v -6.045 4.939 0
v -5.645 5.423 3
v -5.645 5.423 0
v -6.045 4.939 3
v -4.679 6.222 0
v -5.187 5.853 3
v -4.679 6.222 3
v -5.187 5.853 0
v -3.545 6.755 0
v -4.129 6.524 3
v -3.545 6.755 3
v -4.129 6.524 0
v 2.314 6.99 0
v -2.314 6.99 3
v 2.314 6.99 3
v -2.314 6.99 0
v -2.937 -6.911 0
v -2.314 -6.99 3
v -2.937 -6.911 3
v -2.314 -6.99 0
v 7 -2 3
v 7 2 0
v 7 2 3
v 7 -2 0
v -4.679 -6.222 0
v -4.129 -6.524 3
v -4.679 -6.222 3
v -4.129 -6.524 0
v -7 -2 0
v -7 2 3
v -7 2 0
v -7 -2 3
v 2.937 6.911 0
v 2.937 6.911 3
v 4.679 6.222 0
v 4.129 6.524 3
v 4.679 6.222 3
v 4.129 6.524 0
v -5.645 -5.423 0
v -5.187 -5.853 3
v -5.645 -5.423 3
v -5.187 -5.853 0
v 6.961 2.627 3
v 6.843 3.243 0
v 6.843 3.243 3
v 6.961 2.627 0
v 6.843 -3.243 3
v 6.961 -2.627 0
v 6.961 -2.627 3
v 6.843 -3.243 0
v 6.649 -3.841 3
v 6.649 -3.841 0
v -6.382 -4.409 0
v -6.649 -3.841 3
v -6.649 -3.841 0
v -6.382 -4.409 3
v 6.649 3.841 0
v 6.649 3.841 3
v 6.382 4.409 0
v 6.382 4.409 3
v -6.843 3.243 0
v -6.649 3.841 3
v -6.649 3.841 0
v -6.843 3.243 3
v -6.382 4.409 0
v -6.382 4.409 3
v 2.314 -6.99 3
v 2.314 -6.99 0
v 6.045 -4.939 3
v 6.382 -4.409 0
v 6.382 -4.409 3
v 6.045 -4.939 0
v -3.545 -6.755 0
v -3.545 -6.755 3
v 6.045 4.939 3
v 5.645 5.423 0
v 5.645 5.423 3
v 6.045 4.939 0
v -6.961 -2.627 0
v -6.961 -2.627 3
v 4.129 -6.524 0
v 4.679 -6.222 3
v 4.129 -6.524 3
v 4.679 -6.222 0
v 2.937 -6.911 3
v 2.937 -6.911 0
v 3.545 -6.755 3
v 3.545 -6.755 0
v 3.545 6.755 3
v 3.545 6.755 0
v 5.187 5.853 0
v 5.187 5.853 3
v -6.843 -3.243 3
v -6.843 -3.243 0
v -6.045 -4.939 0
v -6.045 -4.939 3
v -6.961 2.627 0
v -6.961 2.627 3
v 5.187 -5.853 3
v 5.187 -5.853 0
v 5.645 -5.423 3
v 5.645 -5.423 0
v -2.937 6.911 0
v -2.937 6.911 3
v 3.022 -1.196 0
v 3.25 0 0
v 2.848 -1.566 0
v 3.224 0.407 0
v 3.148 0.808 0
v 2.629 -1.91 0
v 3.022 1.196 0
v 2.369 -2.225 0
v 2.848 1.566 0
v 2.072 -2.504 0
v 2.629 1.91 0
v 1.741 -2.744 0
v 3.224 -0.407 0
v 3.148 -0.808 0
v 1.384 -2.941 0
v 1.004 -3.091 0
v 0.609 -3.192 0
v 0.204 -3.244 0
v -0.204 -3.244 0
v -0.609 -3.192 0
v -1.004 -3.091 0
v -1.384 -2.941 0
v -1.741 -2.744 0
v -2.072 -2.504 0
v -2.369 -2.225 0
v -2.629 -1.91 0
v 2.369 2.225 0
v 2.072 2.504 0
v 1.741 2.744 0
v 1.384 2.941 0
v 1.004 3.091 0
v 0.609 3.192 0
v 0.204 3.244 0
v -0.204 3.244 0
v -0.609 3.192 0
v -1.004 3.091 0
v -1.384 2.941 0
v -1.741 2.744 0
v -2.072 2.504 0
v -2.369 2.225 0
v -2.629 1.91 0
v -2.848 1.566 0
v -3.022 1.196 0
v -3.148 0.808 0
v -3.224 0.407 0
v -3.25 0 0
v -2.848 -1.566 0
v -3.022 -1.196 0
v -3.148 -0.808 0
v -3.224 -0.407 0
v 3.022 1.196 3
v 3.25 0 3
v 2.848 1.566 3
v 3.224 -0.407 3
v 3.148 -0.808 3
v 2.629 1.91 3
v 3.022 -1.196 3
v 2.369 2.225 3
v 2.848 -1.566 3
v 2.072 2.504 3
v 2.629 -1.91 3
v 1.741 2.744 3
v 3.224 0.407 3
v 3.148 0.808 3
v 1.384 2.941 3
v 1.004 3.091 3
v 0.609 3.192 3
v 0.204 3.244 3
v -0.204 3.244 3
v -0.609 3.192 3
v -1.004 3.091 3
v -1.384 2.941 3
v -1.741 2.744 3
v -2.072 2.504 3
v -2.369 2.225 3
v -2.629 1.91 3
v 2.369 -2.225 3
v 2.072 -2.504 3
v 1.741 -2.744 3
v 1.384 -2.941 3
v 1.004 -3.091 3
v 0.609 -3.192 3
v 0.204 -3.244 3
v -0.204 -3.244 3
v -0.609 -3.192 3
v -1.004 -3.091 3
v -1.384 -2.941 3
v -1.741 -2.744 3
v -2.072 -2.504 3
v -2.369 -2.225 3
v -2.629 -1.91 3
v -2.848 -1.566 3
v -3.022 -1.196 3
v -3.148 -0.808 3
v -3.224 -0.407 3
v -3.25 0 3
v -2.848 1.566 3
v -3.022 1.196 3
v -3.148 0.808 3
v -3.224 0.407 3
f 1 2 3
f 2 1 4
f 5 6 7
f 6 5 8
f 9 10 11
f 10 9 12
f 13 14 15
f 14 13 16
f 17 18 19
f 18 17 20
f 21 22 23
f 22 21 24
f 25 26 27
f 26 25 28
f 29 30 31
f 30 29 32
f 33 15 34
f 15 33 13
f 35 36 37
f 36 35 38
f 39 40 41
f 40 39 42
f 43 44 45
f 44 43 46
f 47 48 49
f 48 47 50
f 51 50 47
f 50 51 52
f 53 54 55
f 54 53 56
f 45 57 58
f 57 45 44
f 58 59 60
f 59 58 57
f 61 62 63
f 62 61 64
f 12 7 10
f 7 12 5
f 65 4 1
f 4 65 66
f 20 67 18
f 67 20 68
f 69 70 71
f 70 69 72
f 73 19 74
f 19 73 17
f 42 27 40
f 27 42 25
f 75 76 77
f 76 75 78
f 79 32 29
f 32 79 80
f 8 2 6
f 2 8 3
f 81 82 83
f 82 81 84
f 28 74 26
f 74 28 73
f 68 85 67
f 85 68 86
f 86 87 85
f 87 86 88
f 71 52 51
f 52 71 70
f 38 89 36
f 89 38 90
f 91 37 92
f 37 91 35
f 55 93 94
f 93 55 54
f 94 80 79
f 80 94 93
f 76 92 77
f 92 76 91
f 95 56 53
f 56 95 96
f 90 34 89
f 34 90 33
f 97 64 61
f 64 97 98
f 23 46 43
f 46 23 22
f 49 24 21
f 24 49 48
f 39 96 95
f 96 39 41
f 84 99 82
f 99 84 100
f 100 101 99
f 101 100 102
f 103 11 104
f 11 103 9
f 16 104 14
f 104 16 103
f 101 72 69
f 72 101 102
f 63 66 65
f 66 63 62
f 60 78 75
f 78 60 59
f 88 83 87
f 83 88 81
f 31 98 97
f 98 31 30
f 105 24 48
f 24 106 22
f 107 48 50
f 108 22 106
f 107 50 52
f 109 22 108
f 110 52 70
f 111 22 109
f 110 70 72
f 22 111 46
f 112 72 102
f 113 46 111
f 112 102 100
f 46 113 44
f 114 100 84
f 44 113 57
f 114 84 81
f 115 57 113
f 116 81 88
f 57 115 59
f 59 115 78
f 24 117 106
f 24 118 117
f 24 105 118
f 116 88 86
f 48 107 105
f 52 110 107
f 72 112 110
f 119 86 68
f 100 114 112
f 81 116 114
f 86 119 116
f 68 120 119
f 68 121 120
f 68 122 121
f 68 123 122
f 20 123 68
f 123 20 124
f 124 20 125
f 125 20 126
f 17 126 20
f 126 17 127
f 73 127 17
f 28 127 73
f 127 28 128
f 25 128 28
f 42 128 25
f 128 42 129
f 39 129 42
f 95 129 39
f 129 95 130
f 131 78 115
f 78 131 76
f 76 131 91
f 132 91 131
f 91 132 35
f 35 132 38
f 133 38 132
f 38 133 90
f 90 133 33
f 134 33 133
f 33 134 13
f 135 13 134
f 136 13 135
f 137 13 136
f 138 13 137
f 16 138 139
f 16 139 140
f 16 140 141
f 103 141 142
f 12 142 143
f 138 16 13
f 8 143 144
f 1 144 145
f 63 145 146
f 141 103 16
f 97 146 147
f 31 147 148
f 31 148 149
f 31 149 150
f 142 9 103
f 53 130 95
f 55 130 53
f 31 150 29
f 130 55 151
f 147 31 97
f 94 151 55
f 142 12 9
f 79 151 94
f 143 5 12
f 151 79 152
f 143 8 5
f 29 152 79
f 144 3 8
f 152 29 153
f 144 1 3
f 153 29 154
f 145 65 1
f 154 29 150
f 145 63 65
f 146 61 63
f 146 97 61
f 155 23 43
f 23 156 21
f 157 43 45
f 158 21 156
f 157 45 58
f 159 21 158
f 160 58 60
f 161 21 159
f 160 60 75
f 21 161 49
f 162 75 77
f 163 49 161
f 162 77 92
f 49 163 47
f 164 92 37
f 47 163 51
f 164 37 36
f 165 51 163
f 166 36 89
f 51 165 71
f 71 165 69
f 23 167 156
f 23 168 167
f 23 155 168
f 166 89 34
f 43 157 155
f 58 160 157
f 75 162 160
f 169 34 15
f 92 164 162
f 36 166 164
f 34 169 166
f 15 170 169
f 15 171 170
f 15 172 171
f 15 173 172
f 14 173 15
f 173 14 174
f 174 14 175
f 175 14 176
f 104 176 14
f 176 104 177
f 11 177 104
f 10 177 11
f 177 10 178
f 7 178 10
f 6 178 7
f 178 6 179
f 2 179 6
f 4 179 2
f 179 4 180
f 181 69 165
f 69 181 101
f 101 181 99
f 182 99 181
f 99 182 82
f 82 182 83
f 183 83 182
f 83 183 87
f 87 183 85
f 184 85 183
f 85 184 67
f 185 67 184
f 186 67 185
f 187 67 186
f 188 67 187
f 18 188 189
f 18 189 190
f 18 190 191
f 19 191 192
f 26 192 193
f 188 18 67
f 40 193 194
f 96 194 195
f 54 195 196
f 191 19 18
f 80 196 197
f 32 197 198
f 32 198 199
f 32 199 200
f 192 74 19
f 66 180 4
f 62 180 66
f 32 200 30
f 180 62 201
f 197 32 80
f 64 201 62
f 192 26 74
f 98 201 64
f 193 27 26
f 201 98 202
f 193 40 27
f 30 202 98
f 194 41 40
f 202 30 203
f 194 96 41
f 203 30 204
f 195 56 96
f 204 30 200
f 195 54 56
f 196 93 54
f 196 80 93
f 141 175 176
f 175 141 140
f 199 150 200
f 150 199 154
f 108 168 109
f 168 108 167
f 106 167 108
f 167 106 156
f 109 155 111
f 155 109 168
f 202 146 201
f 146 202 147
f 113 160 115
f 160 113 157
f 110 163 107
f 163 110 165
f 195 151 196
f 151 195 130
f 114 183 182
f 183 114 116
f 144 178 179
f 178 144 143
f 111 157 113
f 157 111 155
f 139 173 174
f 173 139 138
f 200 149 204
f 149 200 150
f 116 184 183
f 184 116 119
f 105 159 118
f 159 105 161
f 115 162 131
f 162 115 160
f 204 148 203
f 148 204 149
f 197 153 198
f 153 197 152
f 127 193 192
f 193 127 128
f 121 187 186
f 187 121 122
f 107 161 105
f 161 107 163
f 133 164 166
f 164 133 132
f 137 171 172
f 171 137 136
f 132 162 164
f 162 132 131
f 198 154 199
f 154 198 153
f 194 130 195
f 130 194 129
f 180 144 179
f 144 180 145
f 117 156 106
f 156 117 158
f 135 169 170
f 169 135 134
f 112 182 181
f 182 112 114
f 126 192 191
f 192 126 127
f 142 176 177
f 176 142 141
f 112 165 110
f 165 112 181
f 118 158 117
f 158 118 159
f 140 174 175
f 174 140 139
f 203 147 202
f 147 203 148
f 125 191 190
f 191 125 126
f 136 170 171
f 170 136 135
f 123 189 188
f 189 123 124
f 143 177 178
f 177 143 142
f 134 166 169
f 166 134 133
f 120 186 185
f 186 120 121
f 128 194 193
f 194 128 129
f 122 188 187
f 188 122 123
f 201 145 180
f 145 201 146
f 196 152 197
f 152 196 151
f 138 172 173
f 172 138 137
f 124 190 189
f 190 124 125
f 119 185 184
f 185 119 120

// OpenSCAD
// Generated by SolidPython 1.1.3 on 2023-03-12 21:50:26
$fn = 50;


difference() {
	union() {
		translate(v = [0, 0, 0]) {
			rotate(a = [0, 0, 0]) {
				hull() {
					translate(v = [-2.0000000000, 2.0000000000, 0]) {
						rotate(a = [0, 0, 0]) {
							translate(v = [0, 0, 0]) {
								rotate(a = [0, 0, 0]) {
									cylinder(h = 3, r = 5);
								}
							}
						}
					}
					translate(v = [2.0000000000, 2.0000000000, 0]) {
						rotate(a = [0, 0, 0]) {
							translate(v = [0, 0, 0]) {
								rotate(a = [0, 0, 0]) {
									cylinder(h = 3, r = 5);
								}
							}
						}
					}
					translate(v = [-2.0000000000, -2.0000000000, 0]) {
						rotate(a = [0, 0, 0]) {
							translate(v = [0, 0, 0]) {
								rotate(a = [0, 0, 0]) {
									cylinder(h = 3, r = 5);
								}
							}
						}
					}
					translate(v = [2.0000000000, -2.0000000000, 0]) {
						rotate(a = [0, 0, 0]) {
							translate(v = [0, 0, 0]) {
								rotate(a = [0, 0, 0]) {
									cylinder(h = 3, r = 5);
								}
							}
						}
					}
				}
			}
		}
	}
	union() {
		translate(v = [0.0000000000, 0.0000000000, 0]) {
			rotate(a = [0, 0, 0]) {
				translate(v = [0, 0, -50]) {
					rotate(a = [0, 0, 0]) {
						cylinder(h = 100, r = 3.2500000000);
					}
				}
			}
		}
	}
}
/***********************************************
*********      SolidPython code:      **********
************************************************
 
from solid import *
import os
import subprocess

import oomB

import opsc_library_gen

mode = "laser"
#mode = "3d_print"

defined_objects = {}

radius_dict = {}
countersunk_dict = {}


def set_mode(m):
    global mode
    mode = m
    radius_dict['M6'] = 6.5/2
    radius_dict['M3'] = 3.3/2
    if mode == "laser":
        radius_dict['M6'] = 6/2
        radius_dict['M3'] = 3/2

    countersunk_dict['M3'] = {}
    countersunk_dict['M3']['little_rad'] = radius_dict['M3']
    countersunk_dict['M3']['big_rad'] = (5.5+0.6)/2
    if mode == "laser":
        countersunk_dict['M3']['big_rad'] = (4.75+0.6)/2
        countersunk_dict['M3']['little_rad'] = (4.75+0.6)/2

    countersunk_dict['M3']['height'] = 1.7


def opsc_make_object(filename, objects, save_type="none",resolution=50, layers = 1, tilediff = 200, mode="laser", overwrite=True):
    if overwrite or not os.path.exists(filename):
        set_mode(mode)
        save_type = save_type.lower()
        os.makedirs(os.path.dirname(filename), exist_ok=True)
        final_object = opsc_get_object(objects, mode = mode)
        # Save the final object to the specified filename    
        scad_render_to_file(final_object, filename, file_header='$fn = %s;' % resolution, include_orig_code=True)
        if mode == "laser":
            filename_laser = filename.replace(".scad","-flat.scad")
            scad_render_to_file(getLaser(final_object, layers=layers, tilediff=tilediff), filename_laser, file_header='$fn = %s;' % resolution, include_orig_code=True)
            if save_type == "all":
                saveToAll(filename_laser)
            elif save_type == "dxf":
                saveToDxf(filename_laser)
        if save_type == "all":
            saveToAll(filename)
        elif save_type == "dxf":
            saveToDxf(filename)


def opsc_get_object(objects, mode = "laser"):
    # Create the solidpython objects only include the positive objects and if they don't have inclusion or their inclusion is either all or mode
    # Initialize an empty list to store the results
    positive_objects = []

    # Iterate over the "objects" list
    for obj in objects:
        # Check if the current object has a "type" key with a value of "positive"
        if obj['type'] == 'positive':
            # Check if the current object has an "inclusion" key and its value matches "mode",
            # or if the current object does not have an "inclusion" key at all
            if not 'inclusion' in obj or obj['inclusion'] == "all" or obj['inclusion'] == mode:
                # Call the "get_opsc_item" function with the current object as an argument
                opsc_item = get_opsc_item(obj)
                # Add the result to the "positive_objects" list
                positive_objects.append(opsc_item)
# Initialize an empty list to store the results
    negative_objects = []

    # Iterate over the "objects" list
    for obj in objects:
        # Check if the current object has a "type" key with a value of "negative"
        if obj['type'] == 'negative':
            # Check if the current object has an "inclusion" key and its value matches "mode",
            # or if the current object does not have an "inclusion" key at all
            if not 'inclusion' in obj or obj['inclusion'] == "all" or obj['inclusion'] == mode:
                # Call the "get_opsc_item" function with the current object as an argument
                opsc_item = get_opsc_item(obj)
                # Add the result to the "negative_objects" list
                negative_objects.append(opsc_item)
    
    #positive_objects = [get_opsc_item(obj) for obj in objects if obj['type'] == 'positive']
    #negative_objects = [get_opsc_item(obj) for obj in objects if obj['type'] == 'negative']
    # Union the positive objects
    positive_object = union()(*positive_objects)
    # Union the negative objects
    negative_object = union()(*negative_objects)
    # Create the final object by subtracting the negative objects from the positive objects
    return difference()(positive_object, negative_object)

def get_opsc_item(params):
    # A dictionary to map radius string values to numerical values
    #radius_dict = {'small': 5, 'medium': 10, 'large': 15}
    # An array of function names for basic shapes
    basic_shapes = ['cube', 'sphere', 'cylinder']
    
    # An array of function names for other shapes
    other_shapes = ['hole', 'slot', 'rounded_rectangle', 'countersunk']
    


    # Convert radius to r if present, and remove radius from the params dictionary
    if 'radius' in params:
        if isinstance(params['radius'], str):
            # Use the radius_dict to map the radius string value to a numerical value
            params['r'] = radius_dict[params['radius']]
        else:
            params['r'] = params['radius']
        del params['radius']
    

    # Check if the object type is a basic shape
    if params['shape'] in basic_shapes:
        # Remove shape and unexpected dictionary values
        allowed_keys = {'size', 'r', 'r1', 'r2', 'd', 'h', 'rw', 'rh', 'dw', 'dh'}
        shape_params = {k: v for k, v in params.items() if k in allowed_keys}

        # Call the corresponding function for the shape parameter, using ** notation to pass the shape_params dictionary as keyword arguments
        return get_opsc_transform(params,globals()[params['shape']](**shape_params))
    
    # If the object type is not a basic shape, check if it's a defined object or one of the other shapes
    elif params['shape'] in other_shapes:
        # Call the corresponding function for the shape parameter, passing the params dictionary as an argument
        p2 = copy.deepcopy(params)
        p2["pos"] = [0,0,0]
        return get_opsc_transform(params,globals()[params['shape']](p2))
    
    # If the object is not a basic shape or a defined object, try to import it from a .scad file
    else:
        obj = defined_objects[params['shape']]
        return get_opsc_transform(params,obj)

def get_opsc_transform(params, solid_obj):
    # Rotate the object based on the 'rot' field in the params dictionary, or the 'rotX', 'rotY', and 'rotZ' fields if 'rot' is not present
    rot = params.get('rot', [])
    if rot:
        rotX, rotY, rotZ = rot
    else:
        rotX = params.get('rotX', 0)
        rotY = params.get('rotY', 0)
        rotZ = params.get('rotZ', 0)
    solid_obj = rotate([rotX, rotY, rotZ])(solid_obj)

    # Translate the object based on the 'pos' field in the params dictionary, or the 'x', 'y', and 'z' fields if 'pos' is not present
    pos = params.get('pos', [])
    if pos:
        x, y, z = pos
    else:
        x = params.get('x', 0)
        y = params.get('y', 0)
        z = params.get('z', 0)
    solid_obj = translate([x, y, z])(solid_obj)
    return solid_obj


import random

def opsc_easy_array(type, shape, repeats, pos_start, shift_arr, **kwargs):
    for i in range(0,3):
        repeats.append(1)
        pos_start.append(0)
        shift_arr.append(0)
    return_objects = []

    for x in range(0,repeats[0]):
        for y in range(0,repeats[1]):
            for z in range(0,repeats[2]):
                return_objects.append(opsc_easy(type, shape, pos=[pos_start[0]+x*shift_arr[0],pos_start[1]+y*shift_arr[1],pos_start[2]+z*shift_arr[2]], **kwargs))
    return return_objects                



def opsc_easy(type, shape, **kwargs):
    obj = {
        'type': type,
        'shape': shape
    }
    for param in ['size', 'r', 'r1', 'r2', 'd', 'h', 'rw', 'rh', 'dw', 'dh', 'pos', 'x', 'y', 'z', 'rot', 'rotX', 'rotY', 'rotZ', "w", "inclusion"]:
        if param in kwargs:
            obj[param] = kwargs[param]
    return obj

def hole(params):
    p2 = copy.deepcopy(params)  
    # Check if the radius is a string and replace it with the corresponding value from the dictionary
    if isinstance(p2['r'], str):
        p2['r'] = radius_dict[p2['r']]
    
    # Set the height to 100 if not specified
    if 'h' not in p2:
        p2['h'] = 100
        p2["pos"] = [0,0,-50]
    p2["center"] = True
    # Create the cylinder object
    p2["shape"] = "cylinder"
    p2["type"] = "positive"

    return get_opsc_item(p2)

import copy

def countersunk(params):
    p2 = copy.deepcopy(params)
    counter_rad = p2['r']
    p2['r'] = radius_dict[p2['r']]
    hp = copy.deepcopy(p2)
    hp["type"] = "positive"
    hp["shape"] = "hole"
    del hp["rot"]
    hol = get_opsc_item(hp)
    
    cp = copy.deepcopy(p2)
    cp["h"] = countersunk_dict[counter_rad]["height"]
    cp["r2"] = countersunk_dict[counter_rad]["little_rad"]
    cp["r1"] = countersunk_dict[counter_rad]["big_rad"]
    del cp["r"]
    del cp["rot"]
    cp["type"] = "positive"
    cp["shape"] = "cylinder"
    cp["pos"] = [0,0,0]

    top = get_opsc_item(cp)
    return union()(hol,top)



def slot(params):  
    p2 = copy.deepcopy(params) 
    if isinstance(p2['r'], str):
        p2['r'] = radius_dict[p2['r']]
    p2["type"] = "positive"
    p2["shape"] = "hole"
    del p2["rot"]
    p2["pos"] = [0,0,0]
    left = copy.deepcopy(p2)
    right = copy.deepcopy(p2)
    left["pos"][0] = p2["w"] / 2 - p2["r"] 
    
    right["pos"][0] = -p2["w"] / 2 + p2["r"] 
    pass
    leftObj = get_opsc_item(left)
    rightObj = get_opsc_item(right)
    return hull()(leftObj, rightObj)

def rounded_rectangle(params):   
    p2 = copy.deepcopy(params) 
    p2["h"] = p2["size"][2]
    p2["pos"] = p2.get("pos", [0, 0, 0]) 
    p2["type"] = "positive"
    p2["shape"] = "hole"
    p2["pos"] = [0,0,0]
    
    if 'rot' in p2:
        del p2["rot"]   
    if 'r' not in p2:
        p2["r"] = 5 
    tl = copy.deepcopy(p2)
    tr = copy.deepcopy(p2)
    bl = copy.deepcopy(p2)
    br = copy.deepcopy(p2)
    tl["pos"][0] = -(p2["size"][0] - p2["r"]*2)/2
    tl["pos"][1] = (p2["size"][1] - p2["r"]*2)/2
    tr["pos"][0] = (p2["size"][0] - p2["r"]*2)/2
    tr["pos"][1] = (p2["size"][1] - p2["r"]*2)/2
    bl["pos"][0] = -(p2["size"][0] - p2["r"]*2)/2
    bl["pos"][1] = -(p2["size"][1] - p2["r"]*2)/2
    br["pos"][0] = (p2["size"][0] - p2["r"]*2)/2
    br["pos"][1] = -(p2["size"][1] - p2["r"]*2)/2
    del tl["size"]
    del tr["size"]
    del bl["size"]
    del br["size"]
    tlo = get_opsc_item(tl)
    tro = get_opsc_item(tr)
    blo = get_opsc_item(bl)
    bro = get_opsc_item(br)    
    return hull()(tlo, tro, blo, bro)



def import_scad_object(filename):
    # Import the .scad file and convert it to a solidpython object
    #filename = "parts"
    obj = import_scad(filename)
    return obj.main()
    


import os
import solid as solidpython

# A dictionary to store the defined objects


def load_scad_objects():
    opsc_library_gen.gen_library(defined_objects)

import random

def test(num_objects):
    objects = []
    for i in range(num_objects):
        # Choose a random shape
        #shape = random.choice(['cube', 'sphere', 'cylinder', 'hole', 'slot', "rounded_rectangle"])
        shape = random.choice(["rounded_rectangle"])

        # Choose a random type
        type = random.choice(['positive', 'negative'])
        
        # Create an empty object dictionary
        obj = {'shape': shape, 'type': type}
        
        # Set shape-specific parameters
        if obj['shape'] in ['cube']:
            obj['size'] =  [random.uniform(5, 15), random.uniform(5, 15), random.uniform(5, 15)]
        if obj['shape'] in ['rounded_rectangle']:
            obj['size'] =  [random.uniform(5, 15), random.uniform(5, 15), random.uniform(5, 15)]
            obj['r'] = random.uniform(0.5, 5)
        elif obj['shape'] == 'sphere':
            obj['r'] = random.uniform(5, 15)
        elif obj['shape'] in ['cylinder', 'hole']:
            obj['r'] = random.uniform(0.5, 5)
            obj['h'] = random.uniform(5, 15)
        elif obj['shape'] == 'slot':
            obj['r'] = random.uniform(0.5, 5)
            obj['h'] = random.uniform(5, 15)
            obj['w'] = random.uniform(5, 15)
        
        # Set a random position and rotation
        obj['pos'] = [random.uniform(-20, 20), random.uniform(-20, 20), random.uniform(-20, 20)]
        obj['rot'] = [random.uniform(-180, 180), random.uniform(-180, 180), random.uniform(-180, 180)]
        
        # Add the object to the list
        objects.append(obj)
    return objects

####### old file saving
def saveToAll(fileIn):
    saveToDxf(fileIn)
    saveToPng(fileIn)
    saveToStl(fileIn)
    saveToSvg(fileIn)

def saveToDxf(fileIn, fileOut="", copy_to_laser=True):
    if fileOut == "":
        fileOut = fileIn.replace(".scad",".dxf")
    saveToFile(fileIn, fileOut)


    
def saveToPng(fileIn, fileOut="",extra="--render"):
    if fileOut == "":
        fileOut = fileIn.replace(".scad",".png")
    saveToFile(fileIn, fileOut)

def saveToStl(fileIn, fileOut=""):
    if fileOut == "":
        fileOut = fileIn.replace(".scad",".stl")
    saveToFile(fileIn, fileOut)
    
def saveToSvg(fileIn, fileOut=""):
    if fileOut == "":
        fileOut = fileIn.replace(".scad",".svg")
    saveToFile(fileIn, fileOut)

def saveToFile(fileIn, fileOut,extra=""):
    #extra = extra + " --colorscheme Tomorrow"

    launchStr = 'openscad -o "' + fileOut + '"' + extra + ' "' + fileIn + '"'
    if ".png" in fileOut:
        launchStr = launchStr + " --render"
    print("            saveToFile launch string: " + launchStr)
    subprocess.run(launchStr)
    x=0

def getLaser(final_object,start=1.5,layers=1,thickness=3,tilediff=200):
        rv= []

        for x in range(layers):
            rv.append(translate([0,x*tilediff,0])(
                    projection()(
                        intersection()(translate([-500,-500,start+x*thickness])(cube(size=[1000,1000,0.1])),
                            final_object
                        )
                    )
            )
            )
            
        return union()(rv)

set_mode("laser")
load_scad_objects() 
 
************************************************/
